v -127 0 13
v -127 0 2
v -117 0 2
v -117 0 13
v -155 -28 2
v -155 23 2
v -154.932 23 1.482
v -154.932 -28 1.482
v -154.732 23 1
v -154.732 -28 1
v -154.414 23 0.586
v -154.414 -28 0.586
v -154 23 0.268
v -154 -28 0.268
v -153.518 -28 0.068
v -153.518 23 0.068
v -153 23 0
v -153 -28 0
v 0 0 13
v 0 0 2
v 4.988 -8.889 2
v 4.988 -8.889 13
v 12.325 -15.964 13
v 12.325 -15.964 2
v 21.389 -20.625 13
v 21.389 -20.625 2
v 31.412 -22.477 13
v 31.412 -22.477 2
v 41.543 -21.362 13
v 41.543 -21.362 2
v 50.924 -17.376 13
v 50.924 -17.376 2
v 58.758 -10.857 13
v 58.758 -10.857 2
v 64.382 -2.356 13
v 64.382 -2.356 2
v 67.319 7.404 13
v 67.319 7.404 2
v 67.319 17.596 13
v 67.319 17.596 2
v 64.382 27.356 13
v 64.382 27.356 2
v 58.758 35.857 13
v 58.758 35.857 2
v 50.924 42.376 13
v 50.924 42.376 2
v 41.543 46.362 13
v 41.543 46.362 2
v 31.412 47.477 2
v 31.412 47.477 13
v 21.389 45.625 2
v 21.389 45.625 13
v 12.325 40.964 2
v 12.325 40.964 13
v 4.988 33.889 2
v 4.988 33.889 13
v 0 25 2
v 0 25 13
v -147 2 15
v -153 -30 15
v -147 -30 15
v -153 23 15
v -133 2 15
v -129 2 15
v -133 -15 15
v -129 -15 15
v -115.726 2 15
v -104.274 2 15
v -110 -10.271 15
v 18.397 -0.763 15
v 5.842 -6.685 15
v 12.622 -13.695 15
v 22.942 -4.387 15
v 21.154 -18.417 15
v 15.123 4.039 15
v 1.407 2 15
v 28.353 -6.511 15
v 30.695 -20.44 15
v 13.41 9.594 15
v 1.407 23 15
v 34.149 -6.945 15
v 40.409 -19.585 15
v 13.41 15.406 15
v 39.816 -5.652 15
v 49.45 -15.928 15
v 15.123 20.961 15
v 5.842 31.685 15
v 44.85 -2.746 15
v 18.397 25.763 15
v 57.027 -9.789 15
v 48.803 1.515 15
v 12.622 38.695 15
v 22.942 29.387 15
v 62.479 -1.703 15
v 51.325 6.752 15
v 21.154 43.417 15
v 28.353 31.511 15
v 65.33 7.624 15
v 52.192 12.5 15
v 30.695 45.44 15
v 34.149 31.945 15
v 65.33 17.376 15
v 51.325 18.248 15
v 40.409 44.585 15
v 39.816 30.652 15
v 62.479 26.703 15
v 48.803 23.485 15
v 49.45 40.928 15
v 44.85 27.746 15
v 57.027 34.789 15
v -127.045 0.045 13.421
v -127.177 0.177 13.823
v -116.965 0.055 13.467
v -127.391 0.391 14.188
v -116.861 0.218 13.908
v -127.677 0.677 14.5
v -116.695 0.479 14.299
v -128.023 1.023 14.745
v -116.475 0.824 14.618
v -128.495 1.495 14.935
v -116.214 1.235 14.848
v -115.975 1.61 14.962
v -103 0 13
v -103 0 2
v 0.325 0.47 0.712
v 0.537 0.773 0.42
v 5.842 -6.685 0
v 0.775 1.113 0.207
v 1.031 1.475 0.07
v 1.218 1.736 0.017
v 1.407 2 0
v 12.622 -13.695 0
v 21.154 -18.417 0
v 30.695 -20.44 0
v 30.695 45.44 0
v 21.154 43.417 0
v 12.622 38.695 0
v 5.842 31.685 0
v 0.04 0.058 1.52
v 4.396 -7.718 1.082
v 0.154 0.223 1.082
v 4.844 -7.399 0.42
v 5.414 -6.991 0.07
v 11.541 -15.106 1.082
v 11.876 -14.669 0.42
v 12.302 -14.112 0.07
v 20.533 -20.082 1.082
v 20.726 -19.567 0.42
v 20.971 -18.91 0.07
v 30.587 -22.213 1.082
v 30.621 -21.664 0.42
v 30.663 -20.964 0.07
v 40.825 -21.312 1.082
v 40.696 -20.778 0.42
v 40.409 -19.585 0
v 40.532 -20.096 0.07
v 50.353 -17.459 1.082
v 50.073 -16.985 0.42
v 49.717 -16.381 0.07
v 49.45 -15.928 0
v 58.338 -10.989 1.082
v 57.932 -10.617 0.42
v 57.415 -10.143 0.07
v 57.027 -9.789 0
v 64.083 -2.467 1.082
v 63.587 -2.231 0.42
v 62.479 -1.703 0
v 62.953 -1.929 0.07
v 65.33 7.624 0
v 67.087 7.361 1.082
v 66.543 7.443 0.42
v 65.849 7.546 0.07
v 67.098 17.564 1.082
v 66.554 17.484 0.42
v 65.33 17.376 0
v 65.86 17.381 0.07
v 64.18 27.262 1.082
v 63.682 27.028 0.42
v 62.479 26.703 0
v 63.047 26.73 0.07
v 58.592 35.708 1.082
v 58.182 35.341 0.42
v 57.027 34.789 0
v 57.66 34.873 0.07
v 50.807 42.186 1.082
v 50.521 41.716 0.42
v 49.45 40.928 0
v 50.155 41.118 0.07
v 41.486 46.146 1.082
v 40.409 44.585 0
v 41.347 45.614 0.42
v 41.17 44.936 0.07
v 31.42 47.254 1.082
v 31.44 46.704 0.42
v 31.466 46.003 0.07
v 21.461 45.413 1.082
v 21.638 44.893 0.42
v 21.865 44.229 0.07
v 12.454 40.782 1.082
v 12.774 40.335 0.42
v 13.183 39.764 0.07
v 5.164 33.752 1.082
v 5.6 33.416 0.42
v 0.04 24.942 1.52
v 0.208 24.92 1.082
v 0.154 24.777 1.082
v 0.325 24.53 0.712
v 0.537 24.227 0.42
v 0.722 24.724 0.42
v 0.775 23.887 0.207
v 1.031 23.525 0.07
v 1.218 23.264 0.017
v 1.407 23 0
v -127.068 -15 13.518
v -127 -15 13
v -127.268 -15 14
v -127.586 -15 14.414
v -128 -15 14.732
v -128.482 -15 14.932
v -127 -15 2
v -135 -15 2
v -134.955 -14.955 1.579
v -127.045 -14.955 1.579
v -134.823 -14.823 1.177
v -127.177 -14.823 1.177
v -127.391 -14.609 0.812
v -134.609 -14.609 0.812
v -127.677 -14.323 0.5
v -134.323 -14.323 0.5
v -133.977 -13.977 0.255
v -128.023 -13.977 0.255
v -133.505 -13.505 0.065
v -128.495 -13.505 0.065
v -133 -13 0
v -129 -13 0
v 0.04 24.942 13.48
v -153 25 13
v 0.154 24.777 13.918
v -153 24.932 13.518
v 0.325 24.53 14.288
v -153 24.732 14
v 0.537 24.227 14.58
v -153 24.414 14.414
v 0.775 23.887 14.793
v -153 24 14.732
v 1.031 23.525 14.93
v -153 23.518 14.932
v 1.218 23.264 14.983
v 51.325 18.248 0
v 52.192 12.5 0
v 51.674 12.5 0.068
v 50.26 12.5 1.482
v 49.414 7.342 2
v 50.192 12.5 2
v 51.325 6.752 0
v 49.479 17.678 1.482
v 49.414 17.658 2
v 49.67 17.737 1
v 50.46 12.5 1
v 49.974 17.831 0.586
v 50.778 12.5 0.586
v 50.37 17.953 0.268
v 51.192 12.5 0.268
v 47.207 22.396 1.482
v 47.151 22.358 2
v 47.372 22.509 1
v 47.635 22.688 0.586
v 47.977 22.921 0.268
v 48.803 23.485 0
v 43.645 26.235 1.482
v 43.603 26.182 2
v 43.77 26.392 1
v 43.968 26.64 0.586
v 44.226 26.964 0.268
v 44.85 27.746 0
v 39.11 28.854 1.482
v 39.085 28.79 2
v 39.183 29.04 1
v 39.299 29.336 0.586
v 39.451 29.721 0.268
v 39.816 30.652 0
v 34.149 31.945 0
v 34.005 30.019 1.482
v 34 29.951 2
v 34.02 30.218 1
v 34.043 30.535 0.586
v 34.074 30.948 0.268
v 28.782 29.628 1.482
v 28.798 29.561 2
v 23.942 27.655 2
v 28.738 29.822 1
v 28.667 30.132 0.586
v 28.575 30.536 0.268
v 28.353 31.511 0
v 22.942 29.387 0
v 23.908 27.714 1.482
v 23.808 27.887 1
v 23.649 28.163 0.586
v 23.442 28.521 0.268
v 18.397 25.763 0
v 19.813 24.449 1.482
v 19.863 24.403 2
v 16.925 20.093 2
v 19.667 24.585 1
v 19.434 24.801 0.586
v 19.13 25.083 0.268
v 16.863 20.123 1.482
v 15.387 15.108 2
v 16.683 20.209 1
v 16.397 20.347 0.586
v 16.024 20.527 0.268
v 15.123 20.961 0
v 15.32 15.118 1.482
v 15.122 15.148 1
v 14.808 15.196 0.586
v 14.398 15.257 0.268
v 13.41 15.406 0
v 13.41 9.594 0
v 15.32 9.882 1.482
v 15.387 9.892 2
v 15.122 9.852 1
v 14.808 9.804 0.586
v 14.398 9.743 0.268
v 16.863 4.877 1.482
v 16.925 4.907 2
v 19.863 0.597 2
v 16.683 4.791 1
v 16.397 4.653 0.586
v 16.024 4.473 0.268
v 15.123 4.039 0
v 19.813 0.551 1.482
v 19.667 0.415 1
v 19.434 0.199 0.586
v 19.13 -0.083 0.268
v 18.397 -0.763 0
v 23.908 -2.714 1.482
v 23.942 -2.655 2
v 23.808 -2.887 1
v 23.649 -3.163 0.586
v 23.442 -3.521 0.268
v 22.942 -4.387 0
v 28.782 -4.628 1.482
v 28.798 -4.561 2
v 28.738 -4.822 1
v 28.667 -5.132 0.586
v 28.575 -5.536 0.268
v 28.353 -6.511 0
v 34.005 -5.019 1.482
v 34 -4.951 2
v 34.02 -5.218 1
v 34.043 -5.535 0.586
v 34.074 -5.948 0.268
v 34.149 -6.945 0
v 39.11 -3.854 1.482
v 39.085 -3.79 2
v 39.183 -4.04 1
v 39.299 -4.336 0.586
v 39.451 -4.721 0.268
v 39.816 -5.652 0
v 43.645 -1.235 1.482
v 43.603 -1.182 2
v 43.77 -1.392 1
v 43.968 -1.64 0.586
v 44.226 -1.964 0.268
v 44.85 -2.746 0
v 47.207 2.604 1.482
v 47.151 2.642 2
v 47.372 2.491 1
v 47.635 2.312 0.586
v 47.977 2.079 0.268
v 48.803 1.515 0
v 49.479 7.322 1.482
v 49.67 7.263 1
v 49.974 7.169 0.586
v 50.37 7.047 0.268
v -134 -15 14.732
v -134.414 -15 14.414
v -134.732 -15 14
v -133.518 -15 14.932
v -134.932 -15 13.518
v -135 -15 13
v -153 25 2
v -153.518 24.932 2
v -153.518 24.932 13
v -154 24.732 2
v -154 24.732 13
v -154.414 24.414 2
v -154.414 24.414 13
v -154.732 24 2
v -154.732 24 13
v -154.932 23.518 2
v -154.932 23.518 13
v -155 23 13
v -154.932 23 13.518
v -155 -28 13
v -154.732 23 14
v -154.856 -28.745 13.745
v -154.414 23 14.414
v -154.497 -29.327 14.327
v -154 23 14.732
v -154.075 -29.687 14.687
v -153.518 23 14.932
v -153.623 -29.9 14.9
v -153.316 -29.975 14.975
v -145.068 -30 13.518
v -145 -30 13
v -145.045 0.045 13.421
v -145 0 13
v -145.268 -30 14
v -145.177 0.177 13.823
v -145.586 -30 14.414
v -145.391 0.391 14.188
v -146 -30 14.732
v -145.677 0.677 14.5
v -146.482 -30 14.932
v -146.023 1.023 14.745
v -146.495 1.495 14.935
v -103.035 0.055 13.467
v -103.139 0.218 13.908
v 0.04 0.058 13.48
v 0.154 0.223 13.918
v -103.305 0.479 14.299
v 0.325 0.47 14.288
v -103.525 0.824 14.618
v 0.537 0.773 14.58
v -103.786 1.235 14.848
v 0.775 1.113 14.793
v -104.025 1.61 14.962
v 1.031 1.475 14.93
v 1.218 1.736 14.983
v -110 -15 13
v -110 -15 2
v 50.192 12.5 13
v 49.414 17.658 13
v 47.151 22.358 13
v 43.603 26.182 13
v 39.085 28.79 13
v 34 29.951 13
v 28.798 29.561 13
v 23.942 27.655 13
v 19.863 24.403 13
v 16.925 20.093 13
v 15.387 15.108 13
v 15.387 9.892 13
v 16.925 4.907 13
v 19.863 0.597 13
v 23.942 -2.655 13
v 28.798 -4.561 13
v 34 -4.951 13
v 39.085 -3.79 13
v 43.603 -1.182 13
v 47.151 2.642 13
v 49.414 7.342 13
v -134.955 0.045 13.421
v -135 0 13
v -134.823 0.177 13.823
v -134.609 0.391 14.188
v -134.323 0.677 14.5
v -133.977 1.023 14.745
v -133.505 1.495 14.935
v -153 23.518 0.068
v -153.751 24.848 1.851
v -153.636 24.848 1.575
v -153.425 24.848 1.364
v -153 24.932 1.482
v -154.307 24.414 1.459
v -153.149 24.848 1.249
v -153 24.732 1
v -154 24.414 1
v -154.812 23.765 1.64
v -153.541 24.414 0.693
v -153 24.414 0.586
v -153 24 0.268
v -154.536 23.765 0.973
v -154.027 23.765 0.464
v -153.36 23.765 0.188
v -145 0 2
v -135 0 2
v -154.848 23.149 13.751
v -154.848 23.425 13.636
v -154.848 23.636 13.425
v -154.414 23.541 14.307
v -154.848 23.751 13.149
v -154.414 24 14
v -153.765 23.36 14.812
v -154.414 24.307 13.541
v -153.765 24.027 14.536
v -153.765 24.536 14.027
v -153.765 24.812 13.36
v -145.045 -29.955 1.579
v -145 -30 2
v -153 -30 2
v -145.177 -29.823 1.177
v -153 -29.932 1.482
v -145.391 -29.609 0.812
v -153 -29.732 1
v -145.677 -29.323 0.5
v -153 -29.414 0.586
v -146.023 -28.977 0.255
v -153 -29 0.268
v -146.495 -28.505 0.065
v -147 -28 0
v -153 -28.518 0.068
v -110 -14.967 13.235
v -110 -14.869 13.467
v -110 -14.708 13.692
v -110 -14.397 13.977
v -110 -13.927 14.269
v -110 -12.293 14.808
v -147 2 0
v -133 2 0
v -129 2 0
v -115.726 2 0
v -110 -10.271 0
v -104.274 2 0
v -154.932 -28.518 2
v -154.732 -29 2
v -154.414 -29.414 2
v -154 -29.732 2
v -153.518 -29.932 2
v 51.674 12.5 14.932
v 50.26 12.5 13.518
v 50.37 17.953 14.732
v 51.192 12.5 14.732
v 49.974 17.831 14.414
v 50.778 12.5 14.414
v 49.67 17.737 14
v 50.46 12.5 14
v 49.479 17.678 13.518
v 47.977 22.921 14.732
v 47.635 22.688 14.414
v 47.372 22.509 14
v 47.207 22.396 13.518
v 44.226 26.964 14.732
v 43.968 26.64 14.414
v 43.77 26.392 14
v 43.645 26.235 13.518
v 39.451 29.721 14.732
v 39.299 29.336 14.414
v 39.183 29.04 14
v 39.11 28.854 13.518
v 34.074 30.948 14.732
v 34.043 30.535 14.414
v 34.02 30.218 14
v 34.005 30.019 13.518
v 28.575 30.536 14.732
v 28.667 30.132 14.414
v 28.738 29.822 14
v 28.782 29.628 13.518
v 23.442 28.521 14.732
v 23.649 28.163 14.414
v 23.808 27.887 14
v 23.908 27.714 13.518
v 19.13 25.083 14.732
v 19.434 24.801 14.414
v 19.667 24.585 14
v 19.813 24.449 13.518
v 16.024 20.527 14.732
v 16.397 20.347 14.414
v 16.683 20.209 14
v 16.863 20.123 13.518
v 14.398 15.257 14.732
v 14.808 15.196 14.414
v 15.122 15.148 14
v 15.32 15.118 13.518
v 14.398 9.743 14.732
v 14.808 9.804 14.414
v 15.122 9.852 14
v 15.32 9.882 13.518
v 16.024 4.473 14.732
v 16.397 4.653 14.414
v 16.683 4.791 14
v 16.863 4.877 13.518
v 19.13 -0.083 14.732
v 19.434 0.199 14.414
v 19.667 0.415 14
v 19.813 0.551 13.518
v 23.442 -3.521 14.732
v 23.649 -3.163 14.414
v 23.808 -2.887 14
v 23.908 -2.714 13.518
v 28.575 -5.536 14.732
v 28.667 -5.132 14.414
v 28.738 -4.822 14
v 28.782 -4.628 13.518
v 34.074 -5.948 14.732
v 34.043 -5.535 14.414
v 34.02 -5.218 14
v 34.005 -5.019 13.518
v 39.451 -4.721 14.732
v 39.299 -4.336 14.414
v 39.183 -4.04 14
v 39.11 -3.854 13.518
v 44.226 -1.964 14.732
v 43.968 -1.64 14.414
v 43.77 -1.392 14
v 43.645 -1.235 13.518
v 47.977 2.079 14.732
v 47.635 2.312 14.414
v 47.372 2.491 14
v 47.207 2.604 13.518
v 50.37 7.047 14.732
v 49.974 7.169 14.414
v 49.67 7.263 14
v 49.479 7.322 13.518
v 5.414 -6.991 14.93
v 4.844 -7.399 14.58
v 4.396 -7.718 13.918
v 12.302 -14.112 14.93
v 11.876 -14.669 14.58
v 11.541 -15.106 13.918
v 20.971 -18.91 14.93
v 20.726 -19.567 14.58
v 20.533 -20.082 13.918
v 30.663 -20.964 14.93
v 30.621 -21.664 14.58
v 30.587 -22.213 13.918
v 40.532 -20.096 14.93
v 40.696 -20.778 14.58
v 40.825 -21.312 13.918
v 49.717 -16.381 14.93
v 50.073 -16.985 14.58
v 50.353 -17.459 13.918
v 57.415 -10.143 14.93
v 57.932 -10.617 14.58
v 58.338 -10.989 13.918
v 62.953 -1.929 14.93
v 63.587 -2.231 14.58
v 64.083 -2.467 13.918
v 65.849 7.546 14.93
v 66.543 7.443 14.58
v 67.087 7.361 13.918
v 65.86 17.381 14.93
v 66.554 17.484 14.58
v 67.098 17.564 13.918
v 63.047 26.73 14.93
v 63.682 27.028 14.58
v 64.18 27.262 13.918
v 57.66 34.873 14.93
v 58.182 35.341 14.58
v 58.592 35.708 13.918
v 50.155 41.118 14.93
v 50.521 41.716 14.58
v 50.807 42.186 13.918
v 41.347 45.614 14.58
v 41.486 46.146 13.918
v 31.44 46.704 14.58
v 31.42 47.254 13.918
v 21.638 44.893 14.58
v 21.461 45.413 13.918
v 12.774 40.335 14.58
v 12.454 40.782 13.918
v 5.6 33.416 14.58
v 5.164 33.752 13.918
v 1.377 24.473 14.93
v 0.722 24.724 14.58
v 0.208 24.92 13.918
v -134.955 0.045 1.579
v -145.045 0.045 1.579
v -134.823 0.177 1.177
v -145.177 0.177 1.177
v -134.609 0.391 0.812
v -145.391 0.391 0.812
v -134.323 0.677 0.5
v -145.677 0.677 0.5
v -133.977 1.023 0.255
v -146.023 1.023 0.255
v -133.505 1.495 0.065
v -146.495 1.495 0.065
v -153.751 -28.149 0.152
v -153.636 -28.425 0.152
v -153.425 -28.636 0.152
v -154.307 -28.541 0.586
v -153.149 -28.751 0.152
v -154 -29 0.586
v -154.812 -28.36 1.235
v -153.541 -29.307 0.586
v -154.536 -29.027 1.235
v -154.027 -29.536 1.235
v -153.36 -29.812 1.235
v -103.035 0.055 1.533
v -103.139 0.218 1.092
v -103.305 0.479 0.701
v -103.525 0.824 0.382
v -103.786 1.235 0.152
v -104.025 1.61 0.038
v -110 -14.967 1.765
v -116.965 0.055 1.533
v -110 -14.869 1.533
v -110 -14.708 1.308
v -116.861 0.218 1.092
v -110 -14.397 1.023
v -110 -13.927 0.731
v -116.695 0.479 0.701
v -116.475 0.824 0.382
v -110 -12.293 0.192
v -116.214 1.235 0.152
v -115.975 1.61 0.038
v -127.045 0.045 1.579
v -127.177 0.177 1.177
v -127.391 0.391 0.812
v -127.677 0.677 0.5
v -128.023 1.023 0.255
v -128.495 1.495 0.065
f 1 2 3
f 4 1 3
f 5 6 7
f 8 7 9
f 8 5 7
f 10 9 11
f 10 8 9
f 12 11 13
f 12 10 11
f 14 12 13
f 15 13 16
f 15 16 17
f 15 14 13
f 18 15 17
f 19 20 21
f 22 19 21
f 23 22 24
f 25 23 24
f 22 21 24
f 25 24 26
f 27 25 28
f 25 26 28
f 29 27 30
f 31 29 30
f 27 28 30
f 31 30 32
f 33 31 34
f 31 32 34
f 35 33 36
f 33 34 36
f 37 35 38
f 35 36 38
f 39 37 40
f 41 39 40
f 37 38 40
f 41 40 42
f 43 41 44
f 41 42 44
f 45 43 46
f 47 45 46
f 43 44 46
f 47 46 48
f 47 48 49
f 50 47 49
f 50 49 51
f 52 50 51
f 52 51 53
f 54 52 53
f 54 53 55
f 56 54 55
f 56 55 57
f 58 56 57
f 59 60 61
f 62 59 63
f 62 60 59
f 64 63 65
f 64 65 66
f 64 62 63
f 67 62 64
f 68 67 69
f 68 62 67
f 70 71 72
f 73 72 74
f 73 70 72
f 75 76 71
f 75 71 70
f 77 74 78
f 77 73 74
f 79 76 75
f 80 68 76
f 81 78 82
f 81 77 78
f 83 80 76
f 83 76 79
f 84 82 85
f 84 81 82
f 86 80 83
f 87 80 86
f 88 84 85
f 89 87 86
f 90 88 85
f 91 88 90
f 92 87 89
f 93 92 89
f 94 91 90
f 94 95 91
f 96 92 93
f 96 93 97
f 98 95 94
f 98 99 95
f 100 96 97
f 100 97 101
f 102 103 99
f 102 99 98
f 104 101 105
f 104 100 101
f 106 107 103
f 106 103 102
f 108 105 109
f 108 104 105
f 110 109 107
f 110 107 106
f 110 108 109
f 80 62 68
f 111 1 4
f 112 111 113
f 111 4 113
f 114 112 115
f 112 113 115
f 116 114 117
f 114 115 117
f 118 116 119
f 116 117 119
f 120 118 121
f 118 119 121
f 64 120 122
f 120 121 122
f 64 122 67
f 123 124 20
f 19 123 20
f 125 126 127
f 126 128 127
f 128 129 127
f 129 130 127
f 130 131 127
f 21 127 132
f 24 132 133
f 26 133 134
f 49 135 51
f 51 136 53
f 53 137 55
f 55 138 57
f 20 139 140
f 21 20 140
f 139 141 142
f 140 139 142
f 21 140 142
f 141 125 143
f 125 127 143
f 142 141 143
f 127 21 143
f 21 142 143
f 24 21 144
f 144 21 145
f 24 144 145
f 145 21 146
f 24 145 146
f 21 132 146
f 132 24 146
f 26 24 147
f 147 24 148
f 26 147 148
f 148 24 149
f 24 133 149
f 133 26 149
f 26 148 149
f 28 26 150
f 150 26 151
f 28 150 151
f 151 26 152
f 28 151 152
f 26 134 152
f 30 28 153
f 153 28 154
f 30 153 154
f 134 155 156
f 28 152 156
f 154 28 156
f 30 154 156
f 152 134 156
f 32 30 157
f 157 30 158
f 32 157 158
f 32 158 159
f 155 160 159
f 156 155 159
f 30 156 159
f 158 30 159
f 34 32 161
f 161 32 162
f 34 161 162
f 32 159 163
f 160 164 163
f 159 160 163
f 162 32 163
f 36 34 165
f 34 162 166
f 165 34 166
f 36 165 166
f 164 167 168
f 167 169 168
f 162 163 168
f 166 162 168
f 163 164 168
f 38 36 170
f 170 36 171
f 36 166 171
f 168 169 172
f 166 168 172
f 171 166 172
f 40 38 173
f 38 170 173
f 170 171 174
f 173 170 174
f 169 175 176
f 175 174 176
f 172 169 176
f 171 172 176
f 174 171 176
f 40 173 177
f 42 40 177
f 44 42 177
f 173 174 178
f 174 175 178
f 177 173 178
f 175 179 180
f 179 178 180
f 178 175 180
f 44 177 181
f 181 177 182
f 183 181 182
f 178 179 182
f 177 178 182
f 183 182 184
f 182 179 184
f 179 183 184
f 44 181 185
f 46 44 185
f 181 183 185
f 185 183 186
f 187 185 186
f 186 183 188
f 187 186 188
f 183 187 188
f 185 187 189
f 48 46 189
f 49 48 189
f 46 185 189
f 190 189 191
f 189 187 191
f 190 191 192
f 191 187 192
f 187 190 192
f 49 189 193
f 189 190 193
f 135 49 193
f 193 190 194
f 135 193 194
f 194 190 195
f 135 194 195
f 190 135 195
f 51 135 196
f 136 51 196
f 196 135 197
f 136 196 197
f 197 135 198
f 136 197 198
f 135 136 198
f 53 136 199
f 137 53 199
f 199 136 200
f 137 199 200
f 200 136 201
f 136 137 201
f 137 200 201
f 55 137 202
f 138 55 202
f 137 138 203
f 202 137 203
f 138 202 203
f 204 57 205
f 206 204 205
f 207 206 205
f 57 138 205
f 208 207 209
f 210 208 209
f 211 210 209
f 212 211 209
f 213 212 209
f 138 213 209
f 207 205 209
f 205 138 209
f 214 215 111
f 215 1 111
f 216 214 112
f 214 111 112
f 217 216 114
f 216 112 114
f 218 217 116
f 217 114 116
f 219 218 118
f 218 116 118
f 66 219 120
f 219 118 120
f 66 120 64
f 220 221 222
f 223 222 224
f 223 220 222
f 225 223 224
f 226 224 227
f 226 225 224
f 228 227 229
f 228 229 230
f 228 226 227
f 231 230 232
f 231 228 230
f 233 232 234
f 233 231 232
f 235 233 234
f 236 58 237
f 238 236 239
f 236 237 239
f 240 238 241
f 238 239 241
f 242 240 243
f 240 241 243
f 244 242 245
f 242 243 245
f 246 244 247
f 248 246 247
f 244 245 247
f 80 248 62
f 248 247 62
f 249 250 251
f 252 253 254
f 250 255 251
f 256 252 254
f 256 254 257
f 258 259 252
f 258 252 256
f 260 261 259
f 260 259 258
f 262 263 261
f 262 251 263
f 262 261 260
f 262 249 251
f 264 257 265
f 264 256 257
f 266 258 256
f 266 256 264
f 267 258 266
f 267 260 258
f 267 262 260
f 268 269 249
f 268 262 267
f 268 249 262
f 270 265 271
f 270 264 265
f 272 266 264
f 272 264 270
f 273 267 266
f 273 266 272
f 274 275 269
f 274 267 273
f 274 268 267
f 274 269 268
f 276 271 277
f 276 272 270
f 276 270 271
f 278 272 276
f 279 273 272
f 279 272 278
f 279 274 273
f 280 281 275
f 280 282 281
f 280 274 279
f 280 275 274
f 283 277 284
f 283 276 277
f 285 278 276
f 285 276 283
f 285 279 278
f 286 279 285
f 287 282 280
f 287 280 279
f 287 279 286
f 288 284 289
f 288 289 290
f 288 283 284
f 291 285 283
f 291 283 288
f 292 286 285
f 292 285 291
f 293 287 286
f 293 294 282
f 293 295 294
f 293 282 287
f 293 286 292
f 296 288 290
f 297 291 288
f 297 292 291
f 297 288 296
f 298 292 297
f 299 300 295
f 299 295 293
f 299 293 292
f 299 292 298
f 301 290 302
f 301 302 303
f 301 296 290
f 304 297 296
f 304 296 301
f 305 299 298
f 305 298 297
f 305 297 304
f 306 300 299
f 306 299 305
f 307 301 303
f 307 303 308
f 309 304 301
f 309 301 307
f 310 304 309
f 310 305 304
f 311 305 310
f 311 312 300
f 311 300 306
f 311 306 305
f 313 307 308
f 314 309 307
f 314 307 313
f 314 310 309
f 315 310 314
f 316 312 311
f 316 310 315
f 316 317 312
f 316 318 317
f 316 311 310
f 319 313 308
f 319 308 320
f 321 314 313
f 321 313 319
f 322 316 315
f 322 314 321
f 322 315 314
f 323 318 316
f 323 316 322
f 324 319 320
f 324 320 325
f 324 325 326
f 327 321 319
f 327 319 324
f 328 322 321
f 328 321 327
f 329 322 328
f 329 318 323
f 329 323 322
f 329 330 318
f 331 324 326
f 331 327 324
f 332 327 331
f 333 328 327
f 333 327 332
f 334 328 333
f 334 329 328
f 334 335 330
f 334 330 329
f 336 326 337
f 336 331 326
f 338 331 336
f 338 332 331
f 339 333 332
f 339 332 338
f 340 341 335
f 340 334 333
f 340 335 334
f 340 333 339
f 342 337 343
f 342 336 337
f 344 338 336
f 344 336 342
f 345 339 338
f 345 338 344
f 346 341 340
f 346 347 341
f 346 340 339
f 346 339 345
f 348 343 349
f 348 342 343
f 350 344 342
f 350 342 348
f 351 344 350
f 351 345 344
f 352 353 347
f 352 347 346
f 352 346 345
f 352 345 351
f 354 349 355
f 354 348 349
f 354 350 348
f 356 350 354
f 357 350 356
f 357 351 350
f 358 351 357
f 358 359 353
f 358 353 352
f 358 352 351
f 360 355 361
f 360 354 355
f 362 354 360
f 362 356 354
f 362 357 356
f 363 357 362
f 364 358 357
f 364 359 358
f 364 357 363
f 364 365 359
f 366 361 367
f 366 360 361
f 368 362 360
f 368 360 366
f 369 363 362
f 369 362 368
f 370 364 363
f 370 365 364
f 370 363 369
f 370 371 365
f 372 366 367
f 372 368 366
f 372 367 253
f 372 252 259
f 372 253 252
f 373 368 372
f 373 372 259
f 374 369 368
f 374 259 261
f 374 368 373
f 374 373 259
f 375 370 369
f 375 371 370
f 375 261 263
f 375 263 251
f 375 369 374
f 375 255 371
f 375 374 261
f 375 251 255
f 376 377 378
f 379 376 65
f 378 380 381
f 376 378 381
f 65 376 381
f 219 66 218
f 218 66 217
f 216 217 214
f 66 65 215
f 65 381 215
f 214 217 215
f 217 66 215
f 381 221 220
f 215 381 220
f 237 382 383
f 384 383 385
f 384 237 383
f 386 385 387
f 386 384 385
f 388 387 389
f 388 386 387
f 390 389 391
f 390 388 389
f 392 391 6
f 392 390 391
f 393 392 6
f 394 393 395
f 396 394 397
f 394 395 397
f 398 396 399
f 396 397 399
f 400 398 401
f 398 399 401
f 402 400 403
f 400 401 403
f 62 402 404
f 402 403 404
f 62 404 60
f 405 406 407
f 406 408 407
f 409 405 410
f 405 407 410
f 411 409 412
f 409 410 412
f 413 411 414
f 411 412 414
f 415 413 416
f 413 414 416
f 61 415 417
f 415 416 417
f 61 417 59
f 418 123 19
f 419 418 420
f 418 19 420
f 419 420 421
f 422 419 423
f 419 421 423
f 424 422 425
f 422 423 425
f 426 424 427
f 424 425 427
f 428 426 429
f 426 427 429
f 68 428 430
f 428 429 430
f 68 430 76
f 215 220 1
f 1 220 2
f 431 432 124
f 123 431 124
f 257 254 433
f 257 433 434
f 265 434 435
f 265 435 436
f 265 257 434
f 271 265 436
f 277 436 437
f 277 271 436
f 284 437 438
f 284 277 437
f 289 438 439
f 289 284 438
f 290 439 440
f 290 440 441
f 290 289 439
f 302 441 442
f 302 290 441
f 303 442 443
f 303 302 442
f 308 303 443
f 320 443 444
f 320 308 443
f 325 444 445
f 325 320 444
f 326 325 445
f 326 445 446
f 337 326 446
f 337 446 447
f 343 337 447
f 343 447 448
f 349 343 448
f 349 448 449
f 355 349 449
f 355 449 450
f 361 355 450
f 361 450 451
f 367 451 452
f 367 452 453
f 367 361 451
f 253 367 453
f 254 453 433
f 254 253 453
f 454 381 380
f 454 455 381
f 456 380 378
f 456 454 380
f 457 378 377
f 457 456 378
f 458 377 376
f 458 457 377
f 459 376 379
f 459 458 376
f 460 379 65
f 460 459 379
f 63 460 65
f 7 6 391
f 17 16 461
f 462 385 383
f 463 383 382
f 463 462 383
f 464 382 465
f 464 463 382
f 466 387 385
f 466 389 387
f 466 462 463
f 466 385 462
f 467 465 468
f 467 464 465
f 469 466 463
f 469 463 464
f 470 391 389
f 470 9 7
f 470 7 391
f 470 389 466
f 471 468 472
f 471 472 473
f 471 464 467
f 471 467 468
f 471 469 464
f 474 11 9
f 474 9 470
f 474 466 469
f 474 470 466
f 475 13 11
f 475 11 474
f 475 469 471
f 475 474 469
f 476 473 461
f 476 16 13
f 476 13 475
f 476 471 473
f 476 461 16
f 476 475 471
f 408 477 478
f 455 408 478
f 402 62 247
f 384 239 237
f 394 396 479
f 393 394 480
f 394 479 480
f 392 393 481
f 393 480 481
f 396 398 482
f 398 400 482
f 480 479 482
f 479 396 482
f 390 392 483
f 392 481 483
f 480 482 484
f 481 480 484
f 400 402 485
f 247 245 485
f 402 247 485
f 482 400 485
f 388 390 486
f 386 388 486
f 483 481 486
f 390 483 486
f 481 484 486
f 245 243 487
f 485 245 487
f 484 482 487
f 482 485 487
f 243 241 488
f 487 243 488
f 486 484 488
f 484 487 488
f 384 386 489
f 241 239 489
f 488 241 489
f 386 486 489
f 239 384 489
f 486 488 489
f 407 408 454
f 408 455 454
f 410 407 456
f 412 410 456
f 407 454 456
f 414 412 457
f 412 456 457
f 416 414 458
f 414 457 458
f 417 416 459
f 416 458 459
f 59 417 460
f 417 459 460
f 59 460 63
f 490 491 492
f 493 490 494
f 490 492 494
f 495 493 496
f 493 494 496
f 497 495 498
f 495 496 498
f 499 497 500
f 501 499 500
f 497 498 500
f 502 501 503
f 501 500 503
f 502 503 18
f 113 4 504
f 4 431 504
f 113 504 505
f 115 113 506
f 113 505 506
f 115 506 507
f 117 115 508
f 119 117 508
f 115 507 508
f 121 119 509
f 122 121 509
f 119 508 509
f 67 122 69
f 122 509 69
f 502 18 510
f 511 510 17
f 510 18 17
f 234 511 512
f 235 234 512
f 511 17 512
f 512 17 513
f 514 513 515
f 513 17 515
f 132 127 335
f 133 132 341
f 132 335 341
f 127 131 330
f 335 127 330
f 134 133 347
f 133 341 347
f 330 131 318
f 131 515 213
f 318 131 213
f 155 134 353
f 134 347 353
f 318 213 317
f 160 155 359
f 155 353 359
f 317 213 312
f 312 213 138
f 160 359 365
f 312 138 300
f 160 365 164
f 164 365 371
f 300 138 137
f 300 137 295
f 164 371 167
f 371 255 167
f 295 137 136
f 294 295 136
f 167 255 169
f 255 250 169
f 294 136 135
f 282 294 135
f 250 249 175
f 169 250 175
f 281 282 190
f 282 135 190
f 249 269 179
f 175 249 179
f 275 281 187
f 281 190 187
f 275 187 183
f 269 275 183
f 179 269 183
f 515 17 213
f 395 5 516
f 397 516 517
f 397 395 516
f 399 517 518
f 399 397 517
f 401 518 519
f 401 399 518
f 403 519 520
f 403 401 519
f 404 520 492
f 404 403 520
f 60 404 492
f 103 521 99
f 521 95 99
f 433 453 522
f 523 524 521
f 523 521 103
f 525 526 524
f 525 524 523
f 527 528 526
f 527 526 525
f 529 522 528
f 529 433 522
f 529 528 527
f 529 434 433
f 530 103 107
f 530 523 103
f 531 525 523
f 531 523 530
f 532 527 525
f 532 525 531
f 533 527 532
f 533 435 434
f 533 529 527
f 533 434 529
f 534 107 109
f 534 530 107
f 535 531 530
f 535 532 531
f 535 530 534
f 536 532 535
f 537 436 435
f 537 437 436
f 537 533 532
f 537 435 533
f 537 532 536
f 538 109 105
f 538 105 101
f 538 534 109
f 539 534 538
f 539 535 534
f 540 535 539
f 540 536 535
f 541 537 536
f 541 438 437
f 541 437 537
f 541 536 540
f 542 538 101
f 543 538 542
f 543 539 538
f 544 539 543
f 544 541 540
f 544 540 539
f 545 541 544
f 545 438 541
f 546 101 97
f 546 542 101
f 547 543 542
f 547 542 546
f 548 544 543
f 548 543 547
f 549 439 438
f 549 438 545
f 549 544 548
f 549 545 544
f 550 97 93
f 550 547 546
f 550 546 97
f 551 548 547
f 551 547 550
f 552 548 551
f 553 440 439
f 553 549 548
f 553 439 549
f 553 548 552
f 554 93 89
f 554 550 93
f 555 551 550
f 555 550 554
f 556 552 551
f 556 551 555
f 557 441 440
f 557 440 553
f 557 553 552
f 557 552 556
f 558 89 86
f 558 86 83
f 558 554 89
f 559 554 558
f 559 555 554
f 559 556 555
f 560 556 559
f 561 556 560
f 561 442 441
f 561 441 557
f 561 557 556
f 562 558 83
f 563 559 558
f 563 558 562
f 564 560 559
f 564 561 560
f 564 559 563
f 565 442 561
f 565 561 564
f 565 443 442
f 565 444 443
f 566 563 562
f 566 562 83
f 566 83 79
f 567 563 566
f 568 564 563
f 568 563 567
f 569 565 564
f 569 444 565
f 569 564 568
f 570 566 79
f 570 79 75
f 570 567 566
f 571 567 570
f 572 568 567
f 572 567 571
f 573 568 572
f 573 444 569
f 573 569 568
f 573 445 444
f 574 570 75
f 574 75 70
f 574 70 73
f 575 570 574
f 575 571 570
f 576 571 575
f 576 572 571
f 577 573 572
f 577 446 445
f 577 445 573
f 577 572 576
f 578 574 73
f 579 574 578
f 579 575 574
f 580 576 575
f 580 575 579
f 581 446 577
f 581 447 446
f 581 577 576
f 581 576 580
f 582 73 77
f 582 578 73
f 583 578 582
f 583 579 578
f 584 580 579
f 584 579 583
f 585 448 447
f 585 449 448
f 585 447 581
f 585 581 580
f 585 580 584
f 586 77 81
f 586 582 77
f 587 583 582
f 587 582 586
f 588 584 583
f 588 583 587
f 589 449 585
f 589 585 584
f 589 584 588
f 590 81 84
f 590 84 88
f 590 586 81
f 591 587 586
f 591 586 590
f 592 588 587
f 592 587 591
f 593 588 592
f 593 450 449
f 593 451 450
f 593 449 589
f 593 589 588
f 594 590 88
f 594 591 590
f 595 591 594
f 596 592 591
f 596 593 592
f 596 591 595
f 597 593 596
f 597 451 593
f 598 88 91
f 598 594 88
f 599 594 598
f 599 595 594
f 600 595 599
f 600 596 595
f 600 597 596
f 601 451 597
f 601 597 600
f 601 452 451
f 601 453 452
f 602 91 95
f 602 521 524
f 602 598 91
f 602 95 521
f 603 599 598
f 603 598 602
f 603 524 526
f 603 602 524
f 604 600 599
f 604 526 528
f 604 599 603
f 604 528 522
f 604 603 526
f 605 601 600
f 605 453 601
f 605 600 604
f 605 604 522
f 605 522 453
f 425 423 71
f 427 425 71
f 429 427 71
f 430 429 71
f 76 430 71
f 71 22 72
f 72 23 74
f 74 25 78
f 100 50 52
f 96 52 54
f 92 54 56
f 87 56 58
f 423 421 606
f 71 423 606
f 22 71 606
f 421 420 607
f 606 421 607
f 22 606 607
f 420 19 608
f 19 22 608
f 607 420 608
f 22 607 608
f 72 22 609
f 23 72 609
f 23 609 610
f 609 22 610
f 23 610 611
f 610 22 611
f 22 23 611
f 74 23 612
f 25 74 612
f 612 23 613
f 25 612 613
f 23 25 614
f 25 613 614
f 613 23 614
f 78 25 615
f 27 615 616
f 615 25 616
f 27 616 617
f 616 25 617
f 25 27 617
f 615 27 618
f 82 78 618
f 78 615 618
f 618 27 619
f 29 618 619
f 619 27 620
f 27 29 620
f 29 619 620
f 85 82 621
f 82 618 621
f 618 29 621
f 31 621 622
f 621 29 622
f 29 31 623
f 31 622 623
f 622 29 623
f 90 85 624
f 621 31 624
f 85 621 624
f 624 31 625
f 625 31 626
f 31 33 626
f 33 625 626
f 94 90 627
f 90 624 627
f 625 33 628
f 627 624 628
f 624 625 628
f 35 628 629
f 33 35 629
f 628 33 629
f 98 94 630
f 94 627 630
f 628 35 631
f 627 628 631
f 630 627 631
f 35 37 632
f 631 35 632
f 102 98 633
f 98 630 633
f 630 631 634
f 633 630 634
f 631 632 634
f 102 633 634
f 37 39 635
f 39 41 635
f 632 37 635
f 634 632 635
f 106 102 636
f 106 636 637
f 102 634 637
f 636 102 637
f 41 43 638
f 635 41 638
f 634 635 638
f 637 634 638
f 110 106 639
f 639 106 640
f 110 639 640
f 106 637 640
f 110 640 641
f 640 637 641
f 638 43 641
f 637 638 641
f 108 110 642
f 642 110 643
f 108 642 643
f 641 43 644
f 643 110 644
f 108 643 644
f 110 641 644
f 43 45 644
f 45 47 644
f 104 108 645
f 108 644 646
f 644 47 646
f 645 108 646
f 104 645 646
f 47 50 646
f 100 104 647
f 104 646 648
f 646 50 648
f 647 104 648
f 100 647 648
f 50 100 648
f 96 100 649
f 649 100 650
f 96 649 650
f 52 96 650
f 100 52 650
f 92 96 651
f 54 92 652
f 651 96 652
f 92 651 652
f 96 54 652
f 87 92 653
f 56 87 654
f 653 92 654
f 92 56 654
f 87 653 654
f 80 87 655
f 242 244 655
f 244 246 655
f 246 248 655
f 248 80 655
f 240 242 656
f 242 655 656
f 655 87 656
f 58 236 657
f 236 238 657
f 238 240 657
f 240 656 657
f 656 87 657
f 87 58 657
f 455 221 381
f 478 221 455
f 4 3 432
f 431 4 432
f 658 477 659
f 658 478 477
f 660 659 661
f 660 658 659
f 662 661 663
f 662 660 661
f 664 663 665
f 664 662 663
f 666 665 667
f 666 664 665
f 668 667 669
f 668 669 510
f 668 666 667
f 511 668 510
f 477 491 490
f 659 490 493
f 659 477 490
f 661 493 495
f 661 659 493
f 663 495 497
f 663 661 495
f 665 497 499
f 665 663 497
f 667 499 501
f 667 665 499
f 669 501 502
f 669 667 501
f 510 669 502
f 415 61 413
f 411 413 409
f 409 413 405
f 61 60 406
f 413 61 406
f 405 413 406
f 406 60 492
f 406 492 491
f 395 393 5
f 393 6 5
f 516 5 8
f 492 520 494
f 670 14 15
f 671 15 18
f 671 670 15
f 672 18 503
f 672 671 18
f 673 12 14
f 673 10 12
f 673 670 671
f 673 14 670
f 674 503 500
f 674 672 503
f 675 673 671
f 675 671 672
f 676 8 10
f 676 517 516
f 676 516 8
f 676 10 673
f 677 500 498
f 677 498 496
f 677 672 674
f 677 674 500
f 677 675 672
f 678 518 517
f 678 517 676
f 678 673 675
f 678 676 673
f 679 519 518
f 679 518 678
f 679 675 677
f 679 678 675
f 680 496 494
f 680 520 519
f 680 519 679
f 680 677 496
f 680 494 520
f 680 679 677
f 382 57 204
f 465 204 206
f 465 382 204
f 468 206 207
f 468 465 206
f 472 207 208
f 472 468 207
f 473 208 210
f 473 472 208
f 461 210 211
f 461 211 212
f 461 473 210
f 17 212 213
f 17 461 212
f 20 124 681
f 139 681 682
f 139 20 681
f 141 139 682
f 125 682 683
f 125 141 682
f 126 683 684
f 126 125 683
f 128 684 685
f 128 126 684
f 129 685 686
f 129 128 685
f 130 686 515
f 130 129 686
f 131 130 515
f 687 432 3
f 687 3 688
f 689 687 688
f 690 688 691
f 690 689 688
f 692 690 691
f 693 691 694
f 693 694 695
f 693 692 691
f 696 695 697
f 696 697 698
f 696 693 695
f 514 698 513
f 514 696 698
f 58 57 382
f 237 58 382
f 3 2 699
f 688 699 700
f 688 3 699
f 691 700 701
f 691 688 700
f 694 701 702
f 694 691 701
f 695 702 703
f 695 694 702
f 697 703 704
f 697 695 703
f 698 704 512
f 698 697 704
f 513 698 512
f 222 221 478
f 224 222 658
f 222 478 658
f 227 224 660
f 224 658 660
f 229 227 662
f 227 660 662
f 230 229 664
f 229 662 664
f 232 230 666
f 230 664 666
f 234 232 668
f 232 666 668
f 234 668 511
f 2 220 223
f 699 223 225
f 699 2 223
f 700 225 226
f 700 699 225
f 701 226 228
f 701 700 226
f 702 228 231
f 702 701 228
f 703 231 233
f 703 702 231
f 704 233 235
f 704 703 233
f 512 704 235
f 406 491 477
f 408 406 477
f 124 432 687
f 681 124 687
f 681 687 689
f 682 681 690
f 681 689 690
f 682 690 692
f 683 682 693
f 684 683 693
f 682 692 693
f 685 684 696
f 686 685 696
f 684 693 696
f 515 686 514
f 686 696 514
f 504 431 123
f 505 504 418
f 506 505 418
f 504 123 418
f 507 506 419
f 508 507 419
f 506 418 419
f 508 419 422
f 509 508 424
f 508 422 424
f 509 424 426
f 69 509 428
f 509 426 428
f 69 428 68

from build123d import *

# Parameters (mm, degrees)
F0_R     = 17.5
F0_W     = 10
F0_H     = 30
F0_W_2   = 8
F0_H_2   = 15
F1_DEPTH = 15
F2_R     = 2
F3_DEPTH = 15
F4_R     = 2


with BuildPart() as f1:
    # F0 (on Top) → F1 (new body)
    with BuildSketch(Plane.XY):
        Polygon((0, 0), (0, 25), (-155, 25), (-155, 0), (-145, 0), (-135, 0), (-127, 0), (-117, 0), (-103, 0), align=None)
        with BuildLine():
            ThreePointArc((0, 0), (67.6917420766, 12.5), (0, 25))
            Line((0, 25), (0, 0))
        make_face()
        with Locations((32.6917420766, 12.5)):
            Circle(F0_R, mode=Mode.SUBTRACT)
        with Locations((-150, -15)):
            Rectangle(F0_W, F0_H)
        with Locations((-131, -7.5)):
            Rectangle(F0_W_2, F0_H_2)
        Polygon((-110, -15.0000602999), (-103, 0), (-117, 0), align=None)
    extrude(amount=F1_DEPTH)

    # F2
    f2_edges = [f1.edges().sort_by_distance(p)[0] for p in [
        (-77.5, 25, 15),
        (-77.5, 25, 0),
        (-155, -2.5, 0),
        (-155, -2.5, 15),
        (-51.5, 0, 0),
        (-150, -30, 15),
        (-145, -15, 15),
        (-140, 0, 15),
        (-135, -7.5, 15),
        (-131, -15, 15),
        (-127, -7.5, 15),
        (-122, 0, 15),
        (-113.5, -7.50003, 15),
        (-106.5, -7.50003, 15),
        (-51.5, 0, 15),
        (67.691742, 12.5, 15),
        (15.191742, 12.5, 15),
    ]]
    fillet(f2_edges, radius=F2_R)

    # F0 (on Top) → F3 (join)
    with BuildSketch(Plane.XY):
        Polygon((0, 0), (0, 25), (-155, 25), (-155, 0), (-145, 0), (-135, 0), (-127, 0), (-117, 0), (-103, 0), align=None)
        with BuildLine():
            ThreePointArc((0, 0), (67.6917420766, 12.5), (0, 25))
            Line((0, 25), (0, 0))
        make_face()
        with Locations((32.6917420766, 12.5)):
            Circle(F0_R, mode=Mode.SUBTRACT)
        with Locations((-150, -15)):
            Rectangle(F0_W, F0_H)
        Polygon((-110, -15.0000602999), (-103, 0), (-117, 0), align=None)
        with Locations((-131, -7.5)):
            Rectangle(F0_W_2, F0_H_2)
    extrude(amount=F3_DEPTH)

    # F4
    f4_edges = [f1.edges().sort_by_distance(p)[0] for p in [
        (-77.5, 25, 15),
        (-155, -2.5, 15),
        (-145, -15, 15),
        (-135, -7.5, 15),
        (-127, -7.5, 15),
        (-113.5, -7.50003, 15),
        (-106.5, -7.50003, 15),
        (-51.5, 0, 15),
        (-122, 0, 15),
        (-140, 0, 15),
        (-155, -30, 7.5),
        (-155, -2.5, 0),
        (-155, 25, 7.5),
        (67.691742, 12.5, 15),
        (15.191742, 12.5, 15),
        (15.191742, 12.5, 0),
        (67.691742, 12.5, 0),
        (-77.5, 25, 0),
        (-150, -30, 0),
        (-145, -15, 0),
        (-140, 0, 0),
        (-135, -7.5, 0),
        (-131, -15, 0),
        (-127, -7.5, 0),
        (-122, 0, 0),
        (-113.5, -7.50003, 0),
        (-106.5, -7.50003, 0),
        (-51.5, 0, 0),
    ]]
    fillet(f4_edges, radius=F4_R)


solid = f1.part
